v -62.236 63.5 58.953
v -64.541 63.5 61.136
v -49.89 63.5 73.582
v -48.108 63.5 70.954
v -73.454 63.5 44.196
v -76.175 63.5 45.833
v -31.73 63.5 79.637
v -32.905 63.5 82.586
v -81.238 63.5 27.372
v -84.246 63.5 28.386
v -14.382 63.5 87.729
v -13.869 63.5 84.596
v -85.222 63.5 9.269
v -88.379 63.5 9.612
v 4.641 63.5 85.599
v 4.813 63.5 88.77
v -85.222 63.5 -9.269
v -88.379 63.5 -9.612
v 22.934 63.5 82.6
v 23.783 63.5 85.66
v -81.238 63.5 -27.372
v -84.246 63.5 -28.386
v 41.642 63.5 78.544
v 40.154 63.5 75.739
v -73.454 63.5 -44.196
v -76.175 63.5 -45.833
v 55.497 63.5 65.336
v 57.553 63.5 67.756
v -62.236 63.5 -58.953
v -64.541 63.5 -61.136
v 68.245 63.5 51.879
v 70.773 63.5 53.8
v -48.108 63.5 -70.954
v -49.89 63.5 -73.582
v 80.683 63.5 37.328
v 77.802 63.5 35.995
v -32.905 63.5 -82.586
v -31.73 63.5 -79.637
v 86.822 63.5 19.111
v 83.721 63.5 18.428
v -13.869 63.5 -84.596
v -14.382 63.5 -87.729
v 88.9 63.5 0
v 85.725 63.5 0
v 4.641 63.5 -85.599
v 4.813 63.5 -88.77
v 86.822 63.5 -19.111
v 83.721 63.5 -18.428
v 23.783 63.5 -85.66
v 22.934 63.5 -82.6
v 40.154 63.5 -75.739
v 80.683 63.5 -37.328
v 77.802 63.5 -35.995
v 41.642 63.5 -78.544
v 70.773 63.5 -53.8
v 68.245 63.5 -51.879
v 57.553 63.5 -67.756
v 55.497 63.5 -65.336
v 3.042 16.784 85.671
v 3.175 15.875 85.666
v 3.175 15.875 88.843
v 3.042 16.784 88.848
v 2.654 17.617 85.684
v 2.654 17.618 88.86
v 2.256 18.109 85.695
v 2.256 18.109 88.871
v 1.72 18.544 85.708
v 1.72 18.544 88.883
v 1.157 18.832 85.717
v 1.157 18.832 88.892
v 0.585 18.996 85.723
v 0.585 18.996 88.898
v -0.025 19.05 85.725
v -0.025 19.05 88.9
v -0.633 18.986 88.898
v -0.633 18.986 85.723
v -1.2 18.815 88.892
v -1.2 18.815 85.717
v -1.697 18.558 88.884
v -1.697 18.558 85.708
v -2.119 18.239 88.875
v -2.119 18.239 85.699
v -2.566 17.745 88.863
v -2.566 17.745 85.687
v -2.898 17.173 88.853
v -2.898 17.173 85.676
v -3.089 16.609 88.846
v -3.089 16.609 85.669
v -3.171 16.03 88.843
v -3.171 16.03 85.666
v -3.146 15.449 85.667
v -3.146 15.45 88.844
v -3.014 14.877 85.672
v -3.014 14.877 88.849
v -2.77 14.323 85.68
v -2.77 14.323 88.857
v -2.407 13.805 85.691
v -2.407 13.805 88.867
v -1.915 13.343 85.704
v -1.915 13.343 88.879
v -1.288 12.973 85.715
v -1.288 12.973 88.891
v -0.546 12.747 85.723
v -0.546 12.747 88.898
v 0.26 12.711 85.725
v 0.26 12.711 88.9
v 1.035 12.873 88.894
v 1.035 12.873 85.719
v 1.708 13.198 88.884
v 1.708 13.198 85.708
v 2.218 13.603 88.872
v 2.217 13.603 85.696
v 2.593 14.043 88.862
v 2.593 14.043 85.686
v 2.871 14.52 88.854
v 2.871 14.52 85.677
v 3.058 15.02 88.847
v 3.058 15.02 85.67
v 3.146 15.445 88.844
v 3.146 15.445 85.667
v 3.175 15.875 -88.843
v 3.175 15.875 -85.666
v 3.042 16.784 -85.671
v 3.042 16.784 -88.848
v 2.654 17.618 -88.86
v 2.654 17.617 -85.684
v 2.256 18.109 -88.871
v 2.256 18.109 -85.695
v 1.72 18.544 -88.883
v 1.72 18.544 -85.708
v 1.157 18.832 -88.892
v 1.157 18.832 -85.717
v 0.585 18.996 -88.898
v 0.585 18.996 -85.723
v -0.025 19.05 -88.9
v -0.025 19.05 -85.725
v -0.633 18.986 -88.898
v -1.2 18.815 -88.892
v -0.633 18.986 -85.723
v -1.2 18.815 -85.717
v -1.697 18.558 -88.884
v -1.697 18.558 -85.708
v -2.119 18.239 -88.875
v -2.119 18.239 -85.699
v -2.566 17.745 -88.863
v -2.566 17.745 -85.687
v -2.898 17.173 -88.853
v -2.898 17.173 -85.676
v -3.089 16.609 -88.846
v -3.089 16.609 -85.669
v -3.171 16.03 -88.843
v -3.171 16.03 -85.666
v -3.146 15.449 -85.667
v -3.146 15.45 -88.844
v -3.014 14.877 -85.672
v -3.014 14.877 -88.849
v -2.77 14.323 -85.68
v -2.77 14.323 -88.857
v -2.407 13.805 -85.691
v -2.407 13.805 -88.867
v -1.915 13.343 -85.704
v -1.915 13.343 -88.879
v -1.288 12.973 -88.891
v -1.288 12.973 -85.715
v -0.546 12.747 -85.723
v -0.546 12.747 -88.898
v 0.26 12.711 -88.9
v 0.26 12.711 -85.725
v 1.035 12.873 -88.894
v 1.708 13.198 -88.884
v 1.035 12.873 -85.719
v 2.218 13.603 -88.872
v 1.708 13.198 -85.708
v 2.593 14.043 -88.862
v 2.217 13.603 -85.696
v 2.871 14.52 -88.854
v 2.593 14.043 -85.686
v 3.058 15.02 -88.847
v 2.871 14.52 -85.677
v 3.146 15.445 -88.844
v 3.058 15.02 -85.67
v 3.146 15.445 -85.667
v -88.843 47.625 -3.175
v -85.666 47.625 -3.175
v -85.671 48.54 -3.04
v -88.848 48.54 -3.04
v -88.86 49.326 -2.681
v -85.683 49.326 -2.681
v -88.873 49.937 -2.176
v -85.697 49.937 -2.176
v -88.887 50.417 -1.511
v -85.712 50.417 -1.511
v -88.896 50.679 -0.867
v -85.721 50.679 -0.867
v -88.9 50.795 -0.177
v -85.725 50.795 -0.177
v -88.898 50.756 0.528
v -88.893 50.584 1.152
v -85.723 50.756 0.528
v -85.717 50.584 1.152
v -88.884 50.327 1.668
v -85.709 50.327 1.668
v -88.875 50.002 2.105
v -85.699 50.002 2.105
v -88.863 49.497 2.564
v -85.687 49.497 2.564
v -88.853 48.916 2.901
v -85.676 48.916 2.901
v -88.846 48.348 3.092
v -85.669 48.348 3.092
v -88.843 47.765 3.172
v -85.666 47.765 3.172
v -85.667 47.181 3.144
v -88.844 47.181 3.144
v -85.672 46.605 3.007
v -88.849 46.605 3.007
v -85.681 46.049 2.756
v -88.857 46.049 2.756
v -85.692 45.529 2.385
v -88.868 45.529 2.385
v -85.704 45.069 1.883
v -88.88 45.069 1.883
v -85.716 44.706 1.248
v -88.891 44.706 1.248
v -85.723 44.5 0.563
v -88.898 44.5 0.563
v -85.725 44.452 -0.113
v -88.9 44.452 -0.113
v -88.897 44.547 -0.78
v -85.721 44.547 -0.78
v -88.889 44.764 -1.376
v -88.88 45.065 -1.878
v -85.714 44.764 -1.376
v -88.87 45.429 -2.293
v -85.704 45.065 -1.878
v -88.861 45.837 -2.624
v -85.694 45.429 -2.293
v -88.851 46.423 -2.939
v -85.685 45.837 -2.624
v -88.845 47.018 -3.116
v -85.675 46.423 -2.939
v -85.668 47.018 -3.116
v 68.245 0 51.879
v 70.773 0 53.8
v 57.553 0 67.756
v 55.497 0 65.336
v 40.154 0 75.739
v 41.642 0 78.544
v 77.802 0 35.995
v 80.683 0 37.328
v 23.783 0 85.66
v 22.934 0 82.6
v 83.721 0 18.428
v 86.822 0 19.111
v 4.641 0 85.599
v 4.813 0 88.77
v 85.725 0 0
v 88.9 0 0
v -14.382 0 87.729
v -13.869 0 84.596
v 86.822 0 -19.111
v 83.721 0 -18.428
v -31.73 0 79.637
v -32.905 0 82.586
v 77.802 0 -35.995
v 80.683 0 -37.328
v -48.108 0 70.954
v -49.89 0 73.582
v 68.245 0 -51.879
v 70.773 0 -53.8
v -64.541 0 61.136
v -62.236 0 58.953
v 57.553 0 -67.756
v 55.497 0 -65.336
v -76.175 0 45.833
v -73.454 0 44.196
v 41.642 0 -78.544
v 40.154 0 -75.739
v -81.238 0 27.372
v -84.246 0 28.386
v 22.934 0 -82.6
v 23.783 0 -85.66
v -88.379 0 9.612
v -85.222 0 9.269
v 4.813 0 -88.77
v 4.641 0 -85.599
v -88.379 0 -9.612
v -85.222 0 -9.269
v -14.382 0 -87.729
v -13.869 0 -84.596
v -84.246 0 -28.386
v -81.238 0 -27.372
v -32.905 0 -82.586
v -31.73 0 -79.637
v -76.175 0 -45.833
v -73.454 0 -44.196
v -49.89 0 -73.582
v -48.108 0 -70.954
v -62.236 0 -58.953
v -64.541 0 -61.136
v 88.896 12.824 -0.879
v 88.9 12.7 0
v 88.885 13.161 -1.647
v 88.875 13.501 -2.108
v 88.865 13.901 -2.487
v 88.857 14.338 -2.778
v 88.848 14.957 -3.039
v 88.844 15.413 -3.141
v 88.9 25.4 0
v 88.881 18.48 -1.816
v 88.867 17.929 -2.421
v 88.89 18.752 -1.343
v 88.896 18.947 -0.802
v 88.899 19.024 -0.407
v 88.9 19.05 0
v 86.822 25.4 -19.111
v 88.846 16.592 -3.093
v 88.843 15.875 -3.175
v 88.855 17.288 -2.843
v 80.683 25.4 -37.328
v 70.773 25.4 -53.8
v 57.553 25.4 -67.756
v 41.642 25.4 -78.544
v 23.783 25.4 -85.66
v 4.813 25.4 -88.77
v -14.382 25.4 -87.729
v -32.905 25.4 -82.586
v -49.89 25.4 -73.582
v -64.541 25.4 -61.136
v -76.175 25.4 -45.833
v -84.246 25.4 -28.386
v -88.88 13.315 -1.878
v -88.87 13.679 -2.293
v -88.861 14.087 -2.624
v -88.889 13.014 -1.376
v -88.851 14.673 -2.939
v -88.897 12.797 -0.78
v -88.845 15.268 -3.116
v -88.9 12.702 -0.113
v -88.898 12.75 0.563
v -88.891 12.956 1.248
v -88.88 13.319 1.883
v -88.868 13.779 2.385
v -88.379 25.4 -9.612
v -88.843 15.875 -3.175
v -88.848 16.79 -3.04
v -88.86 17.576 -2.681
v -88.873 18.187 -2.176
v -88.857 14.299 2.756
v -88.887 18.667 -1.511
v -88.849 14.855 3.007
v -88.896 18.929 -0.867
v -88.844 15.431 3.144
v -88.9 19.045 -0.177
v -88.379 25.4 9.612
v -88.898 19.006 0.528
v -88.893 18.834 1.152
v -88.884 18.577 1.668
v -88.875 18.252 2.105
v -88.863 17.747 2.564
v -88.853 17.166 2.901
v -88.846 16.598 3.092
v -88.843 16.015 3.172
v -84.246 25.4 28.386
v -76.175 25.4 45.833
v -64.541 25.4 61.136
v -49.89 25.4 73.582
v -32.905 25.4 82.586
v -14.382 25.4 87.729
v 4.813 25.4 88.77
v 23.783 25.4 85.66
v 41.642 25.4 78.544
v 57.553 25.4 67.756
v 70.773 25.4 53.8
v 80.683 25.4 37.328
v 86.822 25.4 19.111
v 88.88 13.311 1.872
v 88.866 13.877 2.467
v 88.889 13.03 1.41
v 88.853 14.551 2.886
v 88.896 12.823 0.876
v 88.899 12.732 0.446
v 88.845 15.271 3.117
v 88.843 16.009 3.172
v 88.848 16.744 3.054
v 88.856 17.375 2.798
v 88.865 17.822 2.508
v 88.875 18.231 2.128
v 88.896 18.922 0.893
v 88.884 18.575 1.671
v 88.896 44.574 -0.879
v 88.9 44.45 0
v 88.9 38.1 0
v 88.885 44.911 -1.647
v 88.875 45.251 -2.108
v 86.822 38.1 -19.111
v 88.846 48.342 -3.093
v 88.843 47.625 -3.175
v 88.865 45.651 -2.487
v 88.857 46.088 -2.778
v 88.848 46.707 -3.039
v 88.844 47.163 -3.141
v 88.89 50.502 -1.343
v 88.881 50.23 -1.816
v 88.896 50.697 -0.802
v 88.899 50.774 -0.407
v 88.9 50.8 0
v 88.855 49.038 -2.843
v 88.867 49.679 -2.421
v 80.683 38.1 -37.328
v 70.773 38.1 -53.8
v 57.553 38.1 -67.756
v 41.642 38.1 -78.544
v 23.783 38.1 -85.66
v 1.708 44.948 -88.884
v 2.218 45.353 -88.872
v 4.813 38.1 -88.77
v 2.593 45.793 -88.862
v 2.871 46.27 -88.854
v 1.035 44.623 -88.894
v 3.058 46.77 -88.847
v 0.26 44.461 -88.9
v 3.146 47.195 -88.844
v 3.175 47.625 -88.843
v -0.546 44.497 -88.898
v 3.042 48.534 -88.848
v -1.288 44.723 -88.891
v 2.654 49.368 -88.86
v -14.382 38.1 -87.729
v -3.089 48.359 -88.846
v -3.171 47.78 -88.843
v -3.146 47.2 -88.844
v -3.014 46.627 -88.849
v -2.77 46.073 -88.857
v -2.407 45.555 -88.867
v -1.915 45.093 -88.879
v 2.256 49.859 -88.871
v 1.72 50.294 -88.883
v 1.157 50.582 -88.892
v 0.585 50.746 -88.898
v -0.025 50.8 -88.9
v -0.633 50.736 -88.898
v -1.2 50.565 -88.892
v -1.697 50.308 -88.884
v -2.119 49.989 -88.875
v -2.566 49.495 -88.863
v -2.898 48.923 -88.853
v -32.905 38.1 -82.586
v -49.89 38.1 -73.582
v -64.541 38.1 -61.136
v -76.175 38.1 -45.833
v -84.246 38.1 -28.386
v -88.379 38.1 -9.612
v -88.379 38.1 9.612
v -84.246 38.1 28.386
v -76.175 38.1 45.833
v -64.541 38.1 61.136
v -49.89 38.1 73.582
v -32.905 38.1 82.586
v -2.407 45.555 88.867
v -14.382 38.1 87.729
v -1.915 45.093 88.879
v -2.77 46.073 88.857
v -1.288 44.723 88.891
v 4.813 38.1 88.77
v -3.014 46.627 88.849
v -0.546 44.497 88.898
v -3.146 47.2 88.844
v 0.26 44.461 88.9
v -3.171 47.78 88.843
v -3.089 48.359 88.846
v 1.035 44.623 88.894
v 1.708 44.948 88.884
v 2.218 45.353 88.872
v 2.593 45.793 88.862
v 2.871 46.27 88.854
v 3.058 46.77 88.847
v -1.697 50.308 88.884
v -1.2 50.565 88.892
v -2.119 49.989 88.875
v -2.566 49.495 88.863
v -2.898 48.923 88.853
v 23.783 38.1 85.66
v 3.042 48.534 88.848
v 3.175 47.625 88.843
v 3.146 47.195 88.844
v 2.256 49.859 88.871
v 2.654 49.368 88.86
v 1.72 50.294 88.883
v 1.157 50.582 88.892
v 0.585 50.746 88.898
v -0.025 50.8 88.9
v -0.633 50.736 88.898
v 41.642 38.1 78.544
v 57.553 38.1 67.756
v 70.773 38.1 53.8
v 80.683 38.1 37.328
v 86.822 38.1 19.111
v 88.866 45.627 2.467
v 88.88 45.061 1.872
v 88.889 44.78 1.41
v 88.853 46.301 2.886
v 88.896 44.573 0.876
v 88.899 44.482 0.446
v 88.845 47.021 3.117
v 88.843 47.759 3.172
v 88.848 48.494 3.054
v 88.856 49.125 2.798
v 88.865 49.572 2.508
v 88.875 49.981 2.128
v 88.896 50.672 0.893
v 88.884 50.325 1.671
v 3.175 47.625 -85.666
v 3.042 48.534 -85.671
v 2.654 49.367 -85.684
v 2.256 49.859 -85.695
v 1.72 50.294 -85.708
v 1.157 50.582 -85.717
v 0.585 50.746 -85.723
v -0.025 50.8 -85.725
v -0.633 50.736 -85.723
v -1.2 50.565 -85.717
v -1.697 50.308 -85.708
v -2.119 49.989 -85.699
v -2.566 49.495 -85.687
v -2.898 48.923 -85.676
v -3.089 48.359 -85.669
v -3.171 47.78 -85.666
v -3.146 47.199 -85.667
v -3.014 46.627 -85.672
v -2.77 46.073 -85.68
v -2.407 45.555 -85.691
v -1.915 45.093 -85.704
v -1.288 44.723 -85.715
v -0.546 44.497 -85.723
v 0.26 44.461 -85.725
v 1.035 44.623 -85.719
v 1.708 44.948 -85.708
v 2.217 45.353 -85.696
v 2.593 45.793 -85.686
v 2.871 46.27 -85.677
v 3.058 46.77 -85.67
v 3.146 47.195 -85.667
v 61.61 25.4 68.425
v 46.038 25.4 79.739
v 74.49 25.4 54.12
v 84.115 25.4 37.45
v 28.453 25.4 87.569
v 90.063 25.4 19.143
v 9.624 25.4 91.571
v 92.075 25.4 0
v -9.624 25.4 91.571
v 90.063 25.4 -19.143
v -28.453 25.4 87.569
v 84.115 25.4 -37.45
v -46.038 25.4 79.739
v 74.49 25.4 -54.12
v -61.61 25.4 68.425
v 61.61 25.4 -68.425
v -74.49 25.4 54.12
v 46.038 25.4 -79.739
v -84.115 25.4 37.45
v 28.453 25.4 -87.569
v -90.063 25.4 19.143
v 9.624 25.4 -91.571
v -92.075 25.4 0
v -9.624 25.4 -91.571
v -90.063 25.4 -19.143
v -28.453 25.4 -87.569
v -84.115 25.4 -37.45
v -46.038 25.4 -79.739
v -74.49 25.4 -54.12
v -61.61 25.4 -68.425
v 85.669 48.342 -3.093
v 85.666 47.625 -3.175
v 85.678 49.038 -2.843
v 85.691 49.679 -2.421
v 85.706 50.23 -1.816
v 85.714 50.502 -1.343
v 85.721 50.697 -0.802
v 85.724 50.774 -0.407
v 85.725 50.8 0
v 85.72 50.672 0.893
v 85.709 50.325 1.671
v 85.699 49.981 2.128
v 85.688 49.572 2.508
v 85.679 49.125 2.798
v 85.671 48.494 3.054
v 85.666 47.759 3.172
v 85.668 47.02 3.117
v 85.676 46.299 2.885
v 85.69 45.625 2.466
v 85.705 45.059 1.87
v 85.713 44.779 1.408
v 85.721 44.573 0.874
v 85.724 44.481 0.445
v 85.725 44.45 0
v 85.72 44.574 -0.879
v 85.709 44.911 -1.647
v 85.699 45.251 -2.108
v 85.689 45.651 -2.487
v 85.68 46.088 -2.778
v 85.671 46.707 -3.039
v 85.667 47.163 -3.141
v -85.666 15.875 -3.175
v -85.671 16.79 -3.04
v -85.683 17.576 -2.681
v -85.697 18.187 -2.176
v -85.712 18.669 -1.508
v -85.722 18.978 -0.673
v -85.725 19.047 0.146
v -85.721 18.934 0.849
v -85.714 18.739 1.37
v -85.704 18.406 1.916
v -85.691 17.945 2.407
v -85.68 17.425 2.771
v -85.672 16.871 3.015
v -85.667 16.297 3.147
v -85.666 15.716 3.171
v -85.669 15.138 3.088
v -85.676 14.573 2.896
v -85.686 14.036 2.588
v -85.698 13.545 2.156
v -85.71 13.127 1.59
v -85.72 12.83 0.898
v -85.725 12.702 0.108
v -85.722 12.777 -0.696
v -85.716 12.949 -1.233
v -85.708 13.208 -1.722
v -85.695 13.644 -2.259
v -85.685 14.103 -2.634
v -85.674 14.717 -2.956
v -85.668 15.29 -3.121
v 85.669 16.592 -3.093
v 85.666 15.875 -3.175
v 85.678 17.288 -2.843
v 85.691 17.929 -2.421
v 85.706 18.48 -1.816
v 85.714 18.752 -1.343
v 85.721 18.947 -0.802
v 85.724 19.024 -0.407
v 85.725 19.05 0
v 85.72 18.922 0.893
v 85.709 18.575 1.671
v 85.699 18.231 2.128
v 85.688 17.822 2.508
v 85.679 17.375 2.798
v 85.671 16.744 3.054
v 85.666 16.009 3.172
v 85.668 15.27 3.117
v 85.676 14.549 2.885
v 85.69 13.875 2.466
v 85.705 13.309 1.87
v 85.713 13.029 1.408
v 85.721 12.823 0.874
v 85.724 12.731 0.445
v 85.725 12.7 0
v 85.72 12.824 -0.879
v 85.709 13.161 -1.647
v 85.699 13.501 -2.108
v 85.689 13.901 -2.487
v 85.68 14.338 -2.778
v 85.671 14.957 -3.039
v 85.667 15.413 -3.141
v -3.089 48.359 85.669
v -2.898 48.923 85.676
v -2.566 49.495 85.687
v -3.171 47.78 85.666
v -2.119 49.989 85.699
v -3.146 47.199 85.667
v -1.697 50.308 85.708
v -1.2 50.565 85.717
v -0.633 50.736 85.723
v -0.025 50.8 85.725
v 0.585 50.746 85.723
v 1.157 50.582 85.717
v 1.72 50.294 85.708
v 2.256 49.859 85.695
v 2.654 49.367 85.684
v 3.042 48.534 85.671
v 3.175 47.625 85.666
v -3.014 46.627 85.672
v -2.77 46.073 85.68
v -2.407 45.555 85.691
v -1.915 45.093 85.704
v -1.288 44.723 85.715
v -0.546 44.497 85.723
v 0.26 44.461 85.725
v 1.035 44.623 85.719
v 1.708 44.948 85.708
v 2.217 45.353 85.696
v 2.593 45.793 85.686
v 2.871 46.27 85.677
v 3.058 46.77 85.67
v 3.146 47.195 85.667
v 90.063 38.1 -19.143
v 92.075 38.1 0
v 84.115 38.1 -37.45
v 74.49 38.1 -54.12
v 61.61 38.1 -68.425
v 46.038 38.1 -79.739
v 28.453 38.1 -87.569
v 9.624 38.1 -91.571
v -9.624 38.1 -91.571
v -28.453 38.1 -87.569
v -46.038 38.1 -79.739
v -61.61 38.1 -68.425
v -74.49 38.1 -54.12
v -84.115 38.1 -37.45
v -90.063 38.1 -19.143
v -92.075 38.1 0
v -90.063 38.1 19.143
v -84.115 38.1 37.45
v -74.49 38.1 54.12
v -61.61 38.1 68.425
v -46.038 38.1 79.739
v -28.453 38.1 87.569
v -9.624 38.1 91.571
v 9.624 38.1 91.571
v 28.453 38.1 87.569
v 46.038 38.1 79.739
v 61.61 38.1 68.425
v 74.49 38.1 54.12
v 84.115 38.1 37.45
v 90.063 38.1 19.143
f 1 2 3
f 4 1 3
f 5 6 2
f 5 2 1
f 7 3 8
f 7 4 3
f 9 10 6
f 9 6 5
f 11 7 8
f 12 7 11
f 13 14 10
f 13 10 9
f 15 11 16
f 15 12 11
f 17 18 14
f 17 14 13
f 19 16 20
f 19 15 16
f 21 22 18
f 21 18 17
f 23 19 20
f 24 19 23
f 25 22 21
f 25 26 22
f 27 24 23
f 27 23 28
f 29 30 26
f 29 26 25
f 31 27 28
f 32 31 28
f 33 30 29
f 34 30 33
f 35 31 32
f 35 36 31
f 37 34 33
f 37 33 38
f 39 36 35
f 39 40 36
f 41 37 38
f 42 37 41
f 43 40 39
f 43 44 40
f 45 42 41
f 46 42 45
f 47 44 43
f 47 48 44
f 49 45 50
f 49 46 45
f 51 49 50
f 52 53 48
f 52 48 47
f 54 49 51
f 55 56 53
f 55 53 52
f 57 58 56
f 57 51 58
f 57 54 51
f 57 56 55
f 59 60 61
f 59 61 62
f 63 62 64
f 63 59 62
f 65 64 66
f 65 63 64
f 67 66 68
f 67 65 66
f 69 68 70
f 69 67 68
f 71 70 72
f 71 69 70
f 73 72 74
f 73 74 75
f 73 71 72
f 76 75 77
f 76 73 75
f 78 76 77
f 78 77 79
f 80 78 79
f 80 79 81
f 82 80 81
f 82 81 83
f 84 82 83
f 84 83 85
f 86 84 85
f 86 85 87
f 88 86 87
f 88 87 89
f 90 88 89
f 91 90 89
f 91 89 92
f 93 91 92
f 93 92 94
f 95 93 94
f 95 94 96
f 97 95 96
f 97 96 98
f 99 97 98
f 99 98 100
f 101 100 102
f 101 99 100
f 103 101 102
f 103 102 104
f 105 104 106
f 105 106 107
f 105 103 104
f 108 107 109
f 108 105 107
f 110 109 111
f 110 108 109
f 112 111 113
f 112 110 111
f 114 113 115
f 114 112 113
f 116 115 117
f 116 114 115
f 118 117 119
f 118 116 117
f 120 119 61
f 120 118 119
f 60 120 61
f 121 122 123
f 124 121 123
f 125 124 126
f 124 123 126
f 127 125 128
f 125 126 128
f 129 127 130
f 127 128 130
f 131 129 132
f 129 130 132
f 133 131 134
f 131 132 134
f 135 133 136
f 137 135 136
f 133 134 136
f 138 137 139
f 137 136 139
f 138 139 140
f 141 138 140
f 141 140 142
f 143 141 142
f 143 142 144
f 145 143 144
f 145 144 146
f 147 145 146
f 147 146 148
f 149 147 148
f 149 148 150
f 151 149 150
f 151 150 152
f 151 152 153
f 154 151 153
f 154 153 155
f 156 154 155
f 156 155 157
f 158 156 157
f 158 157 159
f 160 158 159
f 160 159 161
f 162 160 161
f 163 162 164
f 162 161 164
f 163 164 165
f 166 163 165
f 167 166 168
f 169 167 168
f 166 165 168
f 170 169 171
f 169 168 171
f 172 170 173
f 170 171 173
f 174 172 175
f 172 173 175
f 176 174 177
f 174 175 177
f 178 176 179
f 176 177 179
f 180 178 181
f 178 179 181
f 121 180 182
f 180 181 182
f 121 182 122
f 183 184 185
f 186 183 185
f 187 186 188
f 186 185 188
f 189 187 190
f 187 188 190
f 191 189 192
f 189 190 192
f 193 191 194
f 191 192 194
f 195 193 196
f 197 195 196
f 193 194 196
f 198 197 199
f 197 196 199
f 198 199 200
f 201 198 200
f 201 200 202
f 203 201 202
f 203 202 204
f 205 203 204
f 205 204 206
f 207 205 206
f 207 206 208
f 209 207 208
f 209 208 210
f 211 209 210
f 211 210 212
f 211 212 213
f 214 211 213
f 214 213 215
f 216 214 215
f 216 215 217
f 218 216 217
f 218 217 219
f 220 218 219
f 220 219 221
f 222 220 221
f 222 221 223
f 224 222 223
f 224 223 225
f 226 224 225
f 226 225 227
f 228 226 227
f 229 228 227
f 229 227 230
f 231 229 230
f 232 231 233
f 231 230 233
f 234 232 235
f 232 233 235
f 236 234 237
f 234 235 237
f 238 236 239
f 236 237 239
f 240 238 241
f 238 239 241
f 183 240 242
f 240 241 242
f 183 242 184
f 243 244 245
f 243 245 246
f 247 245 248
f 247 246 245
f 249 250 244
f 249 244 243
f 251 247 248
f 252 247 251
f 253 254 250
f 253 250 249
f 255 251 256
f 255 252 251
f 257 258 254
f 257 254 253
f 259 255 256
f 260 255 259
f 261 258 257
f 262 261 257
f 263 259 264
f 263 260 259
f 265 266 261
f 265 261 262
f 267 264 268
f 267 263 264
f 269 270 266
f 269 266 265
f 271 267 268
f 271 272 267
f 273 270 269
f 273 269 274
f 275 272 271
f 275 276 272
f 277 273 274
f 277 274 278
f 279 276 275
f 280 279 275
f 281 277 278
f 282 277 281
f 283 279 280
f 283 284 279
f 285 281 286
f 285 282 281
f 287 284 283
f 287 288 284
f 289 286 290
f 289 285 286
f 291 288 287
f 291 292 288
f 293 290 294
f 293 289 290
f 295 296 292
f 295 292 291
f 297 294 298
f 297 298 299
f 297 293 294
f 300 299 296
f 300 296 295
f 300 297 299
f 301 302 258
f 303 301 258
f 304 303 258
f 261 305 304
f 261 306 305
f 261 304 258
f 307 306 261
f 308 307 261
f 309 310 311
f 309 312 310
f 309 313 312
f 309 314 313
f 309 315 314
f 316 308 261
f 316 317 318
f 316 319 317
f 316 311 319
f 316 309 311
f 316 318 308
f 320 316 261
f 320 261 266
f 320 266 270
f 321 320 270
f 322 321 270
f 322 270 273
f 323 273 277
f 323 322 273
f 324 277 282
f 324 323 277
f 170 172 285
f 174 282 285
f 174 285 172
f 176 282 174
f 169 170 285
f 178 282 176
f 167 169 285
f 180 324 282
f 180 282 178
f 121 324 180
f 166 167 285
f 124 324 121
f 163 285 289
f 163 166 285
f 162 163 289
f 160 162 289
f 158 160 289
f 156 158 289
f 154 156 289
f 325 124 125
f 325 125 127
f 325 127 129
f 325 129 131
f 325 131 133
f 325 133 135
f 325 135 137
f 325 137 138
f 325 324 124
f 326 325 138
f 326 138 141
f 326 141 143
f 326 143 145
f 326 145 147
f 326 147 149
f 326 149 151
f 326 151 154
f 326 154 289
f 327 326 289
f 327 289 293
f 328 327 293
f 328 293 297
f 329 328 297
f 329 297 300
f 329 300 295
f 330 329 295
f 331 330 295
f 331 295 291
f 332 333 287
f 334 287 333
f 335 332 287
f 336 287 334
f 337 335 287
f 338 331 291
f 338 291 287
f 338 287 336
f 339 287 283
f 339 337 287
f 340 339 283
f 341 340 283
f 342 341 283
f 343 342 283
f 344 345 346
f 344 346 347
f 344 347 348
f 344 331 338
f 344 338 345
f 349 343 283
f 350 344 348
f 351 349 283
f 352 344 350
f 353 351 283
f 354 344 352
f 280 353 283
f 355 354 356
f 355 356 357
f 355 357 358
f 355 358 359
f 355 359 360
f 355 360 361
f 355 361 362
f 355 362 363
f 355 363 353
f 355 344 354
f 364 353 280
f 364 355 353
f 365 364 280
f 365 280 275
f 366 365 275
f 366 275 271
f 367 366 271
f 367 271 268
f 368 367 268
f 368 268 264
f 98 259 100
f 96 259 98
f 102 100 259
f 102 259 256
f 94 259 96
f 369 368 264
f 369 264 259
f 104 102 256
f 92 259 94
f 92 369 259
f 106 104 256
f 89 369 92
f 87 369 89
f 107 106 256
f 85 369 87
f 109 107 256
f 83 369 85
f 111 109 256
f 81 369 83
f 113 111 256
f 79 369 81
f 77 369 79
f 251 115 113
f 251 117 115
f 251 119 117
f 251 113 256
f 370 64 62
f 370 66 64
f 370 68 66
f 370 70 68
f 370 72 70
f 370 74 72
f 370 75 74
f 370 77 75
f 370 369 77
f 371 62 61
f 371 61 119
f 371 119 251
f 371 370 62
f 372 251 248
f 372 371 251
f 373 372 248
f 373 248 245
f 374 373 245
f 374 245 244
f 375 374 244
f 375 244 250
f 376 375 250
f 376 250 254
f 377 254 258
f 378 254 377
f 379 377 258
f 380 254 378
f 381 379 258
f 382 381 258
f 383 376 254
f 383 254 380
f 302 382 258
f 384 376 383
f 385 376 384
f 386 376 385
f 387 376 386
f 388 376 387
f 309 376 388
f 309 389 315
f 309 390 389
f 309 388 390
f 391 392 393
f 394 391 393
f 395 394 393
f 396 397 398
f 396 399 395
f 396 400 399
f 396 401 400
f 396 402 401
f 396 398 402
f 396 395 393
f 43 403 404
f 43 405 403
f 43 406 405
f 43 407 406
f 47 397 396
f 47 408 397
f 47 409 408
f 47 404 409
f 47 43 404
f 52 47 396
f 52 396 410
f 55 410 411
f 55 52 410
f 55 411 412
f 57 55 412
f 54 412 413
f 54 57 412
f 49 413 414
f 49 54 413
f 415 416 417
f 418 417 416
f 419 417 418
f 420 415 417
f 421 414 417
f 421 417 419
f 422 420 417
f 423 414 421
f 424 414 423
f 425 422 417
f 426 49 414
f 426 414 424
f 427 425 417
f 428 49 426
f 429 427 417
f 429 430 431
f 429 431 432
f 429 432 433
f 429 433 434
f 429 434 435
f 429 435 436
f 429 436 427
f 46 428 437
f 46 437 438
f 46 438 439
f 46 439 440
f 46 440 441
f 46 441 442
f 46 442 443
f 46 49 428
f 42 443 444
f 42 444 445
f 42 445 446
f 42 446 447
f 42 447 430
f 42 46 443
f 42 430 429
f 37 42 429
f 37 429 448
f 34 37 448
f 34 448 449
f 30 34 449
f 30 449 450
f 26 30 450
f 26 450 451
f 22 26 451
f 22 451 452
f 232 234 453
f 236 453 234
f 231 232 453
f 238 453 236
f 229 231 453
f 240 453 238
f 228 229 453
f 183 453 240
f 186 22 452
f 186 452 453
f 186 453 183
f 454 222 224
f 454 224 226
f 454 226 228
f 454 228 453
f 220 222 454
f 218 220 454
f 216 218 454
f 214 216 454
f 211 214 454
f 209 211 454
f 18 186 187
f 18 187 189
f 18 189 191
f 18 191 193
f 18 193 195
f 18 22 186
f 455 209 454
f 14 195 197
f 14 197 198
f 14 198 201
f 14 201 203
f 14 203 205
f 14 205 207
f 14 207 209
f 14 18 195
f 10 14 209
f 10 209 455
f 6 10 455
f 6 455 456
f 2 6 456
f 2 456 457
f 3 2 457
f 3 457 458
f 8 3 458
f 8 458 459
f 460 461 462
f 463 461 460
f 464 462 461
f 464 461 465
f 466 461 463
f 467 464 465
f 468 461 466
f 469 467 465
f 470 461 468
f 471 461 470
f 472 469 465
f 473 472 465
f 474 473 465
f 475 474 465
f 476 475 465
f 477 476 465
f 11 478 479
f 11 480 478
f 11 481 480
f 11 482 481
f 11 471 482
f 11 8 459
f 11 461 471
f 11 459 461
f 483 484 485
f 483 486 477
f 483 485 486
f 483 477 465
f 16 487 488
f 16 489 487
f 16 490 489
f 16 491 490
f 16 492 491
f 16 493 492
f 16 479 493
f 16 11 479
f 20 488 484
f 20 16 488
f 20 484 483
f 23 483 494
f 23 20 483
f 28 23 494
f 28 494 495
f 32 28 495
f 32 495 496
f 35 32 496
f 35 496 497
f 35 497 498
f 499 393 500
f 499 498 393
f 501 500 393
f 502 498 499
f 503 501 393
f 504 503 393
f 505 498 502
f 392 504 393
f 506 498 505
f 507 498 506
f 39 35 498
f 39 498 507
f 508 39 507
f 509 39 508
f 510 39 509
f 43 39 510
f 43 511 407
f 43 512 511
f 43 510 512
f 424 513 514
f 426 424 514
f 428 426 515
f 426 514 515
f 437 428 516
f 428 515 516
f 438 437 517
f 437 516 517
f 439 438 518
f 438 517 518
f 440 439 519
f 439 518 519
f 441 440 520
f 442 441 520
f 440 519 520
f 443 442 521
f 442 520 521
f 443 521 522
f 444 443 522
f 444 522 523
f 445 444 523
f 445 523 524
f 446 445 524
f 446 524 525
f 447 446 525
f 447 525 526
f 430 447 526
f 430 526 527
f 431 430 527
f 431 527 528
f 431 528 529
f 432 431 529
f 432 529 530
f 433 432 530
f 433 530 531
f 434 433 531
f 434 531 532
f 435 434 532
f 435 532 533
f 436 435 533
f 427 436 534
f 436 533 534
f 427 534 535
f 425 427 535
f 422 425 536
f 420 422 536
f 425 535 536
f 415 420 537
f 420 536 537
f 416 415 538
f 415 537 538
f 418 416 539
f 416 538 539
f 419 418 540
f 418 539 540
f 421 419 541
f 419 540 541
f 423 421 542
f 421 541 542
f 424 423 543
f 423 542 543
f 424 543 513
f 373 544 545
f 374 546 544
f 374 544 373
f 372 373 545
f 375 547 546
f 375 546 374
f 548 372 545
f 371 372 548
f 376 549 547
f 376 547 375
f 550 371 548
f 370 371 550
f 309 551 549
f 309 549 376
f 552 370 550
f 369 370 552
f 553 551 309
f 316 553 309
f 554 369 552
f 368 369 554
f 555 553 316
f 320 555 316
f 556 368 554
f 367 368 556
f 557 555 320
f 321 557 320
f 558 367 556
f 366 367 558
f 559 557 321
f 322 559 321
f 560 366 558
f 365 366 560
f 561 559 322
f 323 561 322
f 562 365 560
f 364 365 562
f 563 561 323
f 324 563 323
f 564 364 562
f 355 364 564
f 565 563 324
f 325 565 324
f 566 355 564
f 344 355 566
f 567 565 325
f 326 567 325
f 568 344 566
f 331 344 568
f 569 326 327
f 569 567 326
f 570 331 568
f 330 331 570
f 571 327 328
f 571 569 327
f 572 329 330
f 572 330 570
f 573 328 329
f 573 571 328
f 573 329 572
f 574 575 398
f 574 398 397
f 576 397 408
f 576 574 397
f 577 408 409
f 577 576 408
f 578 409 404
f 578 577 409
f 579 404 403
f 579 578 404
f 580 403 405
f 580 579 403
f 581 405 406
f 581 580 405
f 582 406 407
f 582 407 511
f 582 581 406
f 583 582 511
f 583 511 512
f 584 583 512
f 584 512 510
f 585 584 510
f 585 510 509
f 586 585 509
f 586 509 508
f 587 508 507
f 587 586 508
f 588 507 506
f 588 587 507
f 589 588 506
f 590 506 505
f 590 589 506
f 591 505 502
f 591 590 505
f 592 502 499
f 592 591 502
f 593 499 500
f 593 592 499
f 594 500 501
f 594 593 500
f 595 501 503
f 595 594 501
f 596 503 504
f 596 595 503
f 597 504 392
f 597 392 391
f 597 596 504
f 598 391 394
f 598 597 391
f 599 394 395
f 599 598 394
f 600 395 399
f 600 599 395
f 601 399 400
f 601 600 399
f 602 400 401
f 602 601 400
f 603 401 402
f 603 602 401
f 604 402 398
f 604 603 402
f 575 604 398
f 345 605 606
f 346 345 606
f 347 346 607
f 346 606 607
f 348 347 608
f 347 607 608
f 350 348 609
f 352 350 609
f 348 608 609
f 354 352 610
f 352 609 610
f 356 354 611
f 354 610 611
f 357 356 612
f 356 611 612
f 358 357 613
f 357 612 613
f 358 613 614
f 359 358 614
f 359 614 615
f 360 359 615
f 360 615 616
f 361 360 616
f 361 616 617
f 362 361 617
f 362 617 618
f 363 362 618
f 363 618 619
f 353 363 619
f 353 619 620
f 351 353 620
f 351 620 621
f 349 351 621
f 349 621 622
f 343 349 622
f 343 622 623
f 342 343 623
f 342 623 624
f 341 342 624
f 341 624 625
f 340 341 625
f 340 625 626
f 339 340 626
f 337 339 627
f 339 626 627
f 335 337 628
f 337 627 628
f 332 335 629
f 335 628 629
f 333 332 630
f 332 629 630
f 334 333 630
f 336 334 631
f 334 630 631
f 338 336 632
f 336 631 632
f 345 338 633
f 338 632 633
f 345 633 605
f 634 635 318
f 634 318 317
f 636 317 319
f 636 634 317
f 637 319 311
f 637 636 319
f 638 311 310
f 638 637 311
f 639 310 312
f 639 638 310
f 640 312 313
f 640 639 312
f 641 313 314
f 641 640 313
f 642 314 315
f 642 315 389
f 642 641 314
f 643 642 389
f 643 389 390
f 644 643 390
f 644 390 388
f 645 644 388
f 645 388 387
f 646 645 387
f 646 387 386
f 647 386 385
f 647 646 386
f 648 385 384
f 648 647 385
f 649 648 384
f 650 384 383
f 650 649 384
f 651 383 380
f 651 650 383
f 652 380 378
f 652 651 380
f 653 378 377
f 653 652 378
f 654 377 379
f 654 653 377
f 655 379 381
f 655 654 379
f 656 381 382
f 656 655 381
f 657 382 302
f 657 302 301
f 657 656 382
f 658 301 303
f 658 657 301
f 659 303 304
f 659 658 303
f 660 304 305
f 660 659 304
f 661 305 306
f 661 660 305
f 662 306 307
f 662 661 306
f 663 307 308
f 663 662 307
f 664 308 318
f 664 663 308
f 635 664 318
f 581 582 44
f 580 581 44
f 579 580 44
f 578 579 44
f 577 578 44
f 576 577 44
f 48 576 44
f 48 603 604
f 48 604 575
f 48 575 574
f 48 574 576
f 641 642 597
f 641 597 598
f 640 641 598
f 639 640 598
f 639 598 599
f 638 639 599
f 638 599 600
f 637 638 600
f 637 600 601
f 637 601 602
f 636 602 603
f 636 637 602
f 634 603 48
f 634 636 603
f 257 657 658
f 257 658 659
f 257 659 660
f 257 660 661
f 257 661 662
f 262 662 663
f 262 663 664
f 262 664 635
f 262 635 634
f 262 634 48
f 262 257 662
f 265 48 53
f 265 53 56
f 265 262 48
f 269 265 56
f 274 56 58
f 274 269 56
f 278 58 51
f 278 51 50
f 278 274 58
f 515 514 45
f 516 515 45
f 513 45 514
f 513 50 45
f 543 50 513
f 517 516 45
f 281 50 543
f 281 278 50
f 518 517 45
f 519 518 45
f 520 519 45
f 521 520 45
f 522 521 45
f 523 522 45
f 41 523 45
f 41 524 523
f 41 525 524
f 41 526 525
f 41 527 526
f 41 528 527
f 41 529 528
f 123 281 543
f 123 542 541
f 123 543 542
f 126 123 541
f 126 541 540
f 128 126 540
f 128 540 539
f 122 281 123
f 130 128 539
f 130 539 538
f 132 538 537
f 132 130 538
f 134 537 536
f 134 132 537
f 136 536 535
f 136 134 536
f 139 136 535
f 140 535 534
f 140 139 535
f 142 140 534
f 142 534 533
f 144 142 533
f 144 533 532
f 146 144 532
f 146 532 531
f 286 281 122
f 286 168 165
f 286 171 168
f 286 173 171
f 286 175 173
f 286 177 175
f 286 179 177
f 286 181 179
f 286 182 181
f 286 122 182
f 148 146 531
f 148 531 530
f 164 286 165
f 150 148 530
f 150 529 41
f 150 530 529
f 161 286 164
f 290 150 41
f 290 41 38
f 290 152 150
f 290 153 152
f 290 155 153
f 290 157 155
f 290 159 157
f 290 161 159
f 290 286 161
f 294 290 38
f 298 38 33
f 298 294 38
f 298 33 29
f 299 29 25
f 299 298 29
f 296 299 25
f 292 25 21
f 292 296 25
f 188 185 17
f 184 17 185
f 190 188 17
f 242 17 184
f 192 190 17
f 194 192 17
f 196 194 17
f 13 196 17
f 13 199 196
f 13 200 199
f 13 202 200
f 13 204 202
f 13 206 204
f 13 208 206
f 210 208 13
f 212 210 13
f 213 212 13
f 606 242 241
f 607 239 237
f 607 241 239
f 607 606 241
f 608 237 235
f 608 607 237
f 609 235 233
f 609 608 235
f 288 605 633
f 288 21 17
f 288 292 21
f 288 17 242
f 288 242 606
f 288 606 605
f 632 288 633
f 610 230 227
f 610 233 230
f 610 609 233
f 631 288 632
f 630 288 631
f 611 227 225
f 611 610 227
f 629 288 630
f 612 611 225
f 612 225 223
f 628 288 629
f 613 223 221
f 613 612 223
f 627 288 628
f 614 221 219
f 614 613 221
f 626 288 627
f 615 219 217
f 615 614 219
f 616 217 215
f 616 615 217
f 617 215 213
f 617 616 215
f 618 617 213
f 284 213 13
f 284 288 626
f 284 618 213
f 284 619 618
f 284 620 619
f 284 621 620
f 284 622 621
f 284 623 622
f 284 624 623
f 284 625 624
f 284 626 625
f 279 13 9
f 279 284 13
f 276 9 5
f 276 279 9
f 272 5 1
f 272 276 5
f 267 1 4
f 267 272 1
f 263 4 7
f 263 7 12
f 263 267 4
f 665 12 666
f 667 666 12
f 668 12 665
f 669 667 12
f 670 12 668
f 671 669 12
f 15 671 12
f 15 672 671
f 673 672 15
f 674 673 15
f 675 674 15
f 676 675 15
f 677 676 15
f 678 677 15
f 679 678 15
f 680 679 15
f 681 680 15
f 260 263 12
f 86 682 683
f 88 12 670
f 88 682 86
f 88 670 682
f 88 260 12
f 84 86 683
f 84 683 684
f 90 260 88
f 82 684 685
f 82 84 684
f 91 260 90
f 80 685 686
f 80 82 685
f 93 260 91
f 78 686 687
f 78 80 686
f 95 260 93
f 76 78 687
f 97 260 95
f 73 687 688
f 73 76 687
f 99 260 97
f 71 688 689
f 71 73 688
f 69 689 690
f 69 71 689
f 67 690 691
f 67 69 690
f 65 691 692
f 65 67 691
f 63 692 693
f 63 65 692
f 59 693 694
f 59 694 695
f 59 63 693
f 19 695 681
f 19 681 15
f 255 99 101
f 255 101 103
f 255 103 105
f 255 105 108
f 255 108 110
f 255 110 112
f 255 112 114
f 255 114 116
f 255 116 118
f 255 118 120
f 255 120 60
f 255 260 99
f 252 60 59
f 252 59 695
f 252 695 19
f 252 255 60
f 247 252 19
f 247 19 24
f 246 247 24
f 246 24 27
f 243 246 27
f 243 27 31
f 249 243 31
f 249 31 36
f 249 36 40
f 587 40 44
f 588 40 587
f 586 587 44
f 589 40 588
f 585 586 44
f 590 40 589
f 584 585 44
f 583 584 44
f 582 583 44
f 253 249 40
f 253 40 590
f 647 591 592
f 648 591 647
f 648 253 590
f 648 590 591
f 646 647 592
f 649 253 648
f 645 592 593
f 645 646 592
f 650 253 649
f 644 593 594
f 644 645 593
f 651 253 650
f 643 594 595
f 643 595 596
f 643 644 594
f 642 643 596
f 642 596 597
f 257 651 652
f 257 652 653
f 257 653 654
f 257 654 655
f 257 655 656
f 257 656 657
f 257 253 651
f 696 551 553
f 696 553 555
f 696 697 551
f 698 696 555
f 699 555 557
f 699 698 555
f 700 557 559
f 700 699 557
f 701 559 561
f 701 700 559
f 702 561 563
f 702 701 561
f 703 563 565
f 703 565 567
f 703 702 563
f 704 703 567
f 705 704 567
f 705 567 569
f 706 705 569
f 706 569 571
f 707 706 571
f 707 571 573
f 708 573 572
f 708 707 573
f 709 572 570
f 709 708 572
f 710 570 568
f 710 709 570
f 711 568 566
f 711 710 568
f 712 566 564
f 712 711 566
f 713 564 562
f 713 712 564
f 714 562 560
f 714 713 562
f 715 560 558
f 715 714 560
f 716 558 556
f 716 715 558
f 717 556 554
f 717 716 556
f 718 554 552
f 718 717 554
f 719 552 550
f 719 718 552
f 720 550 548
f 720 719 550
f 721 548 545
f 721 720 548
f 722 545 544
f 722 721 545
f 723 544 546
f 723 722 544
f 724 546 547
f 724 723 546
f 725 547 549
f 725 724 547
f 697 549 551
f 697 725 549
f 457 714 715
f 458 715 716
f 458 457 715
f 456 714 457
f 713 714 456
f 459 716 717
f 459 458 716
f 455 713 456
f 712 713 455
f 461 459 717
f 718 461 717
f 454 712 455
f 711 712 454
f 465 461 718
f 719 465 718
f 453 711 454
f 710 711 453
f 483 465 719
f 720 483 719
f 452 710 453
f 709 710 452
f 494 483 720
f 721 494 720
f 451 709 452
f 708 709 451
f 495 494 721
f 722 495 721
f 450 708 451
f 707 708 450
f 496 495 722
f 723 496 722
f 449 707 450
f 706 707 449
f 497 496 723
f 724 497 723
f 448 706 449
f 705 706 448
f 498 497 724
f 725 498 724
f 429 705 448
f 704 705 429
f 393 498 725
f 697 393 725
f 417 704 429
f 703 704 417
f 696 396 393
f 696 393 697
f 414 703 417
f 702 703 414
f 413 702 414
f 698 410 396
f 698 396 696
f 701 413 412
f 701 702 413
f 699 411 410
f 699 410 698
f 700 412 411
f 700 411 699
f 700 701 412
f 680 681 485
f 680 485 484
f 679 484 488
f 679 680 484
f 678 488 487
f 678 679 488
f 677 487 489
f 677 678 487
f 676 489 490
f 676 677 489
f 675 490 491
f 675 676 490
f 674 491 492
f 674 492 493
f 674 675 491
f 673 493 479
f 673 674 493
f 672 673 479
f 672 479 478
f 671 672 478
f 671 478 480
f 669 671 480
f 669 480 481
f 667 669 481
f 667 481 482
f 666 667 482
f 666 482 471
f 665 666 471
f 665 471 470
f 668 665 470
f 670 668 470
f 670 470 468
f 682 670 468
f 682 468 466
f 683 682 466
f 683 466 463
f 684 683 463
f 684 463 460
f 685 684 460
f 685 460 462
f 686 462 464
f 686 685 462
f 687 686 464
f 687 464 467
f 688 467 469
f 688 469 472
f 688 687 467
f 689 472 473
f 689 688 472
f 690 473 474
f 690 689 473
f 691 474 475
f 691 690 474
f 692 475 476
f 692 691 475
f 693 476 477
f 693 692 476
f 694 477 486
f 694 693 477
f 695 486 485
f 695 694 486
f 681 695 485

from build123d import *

# Parameters (mm, degrees)
SKETCH2_R               = 3.175
CUT_EXTRUDE1_DEPTH      = 93.075
CUT_EXTRUDE1_DEPTH_BACK = 93.075
SKETCH3_R               = 3.175
CUT_EXTRUDE2_DEPTH      = 93.075
CUT_EXTRUDE2_DEPTH_BACK = 93.075


with BuildPart() as part:
    # Sketch1 → Revolve1 (revolve)
    with BuildSketch(Plane.XY):
        Polygon((92.075, 25.4), (92.075, 38.1), (88.9, 38.1), (88.9, 63.5), (85.725, 63.5), (85.725, 0), (88.9, 0), (88.9, 25.4), align=None)
    revolve(axis=Axis((0, 0, 0), (0, 1, 0)))

    # Sketch2 → Cut-Extrude1 (cut, two sides)
    with BuildSketch(Plane.XY) as cut_extrude1_sk:
        with Locations((0, 47.625)):
            Circle(SKETCH2_R)
        with Locations((0, 15.875)):
            Circle(SKETCH2_R)
    extrude(amount=CUT_EXTRUDE1_DEPTH, mode=Mode.SUBTRACT)
    extrude(cut_extrude1_sk.sketch, amount=-CUT_EXTRUDE1_DEPTH_BACK, mode=Mode.SUBTRACT)

    # Sketch3 → Cut-Extrude2 (cut, two sides)
    with BuildSketch(Plane(origin=(0, 0, 0), x_dir=(0, 0, -1), z_dir=(1, 0, 0))) as cut_extrude2_sk:
        with Locations((0, 47.625)):
            Circle(SKETCH3_R)
        with Locations((0, 15.875)):
            Circle(SKETCH3_R)
    extrude(amount=CUT_EXTRUDE2_DEPTH, mode=Mode.SUBTRACT)
    extrude(cut_extrude2_sk.sketch, amount=-CUT_EXTRUDE2_DEPTH_BACK, mode=Mode.SUBTRACT)


solid = part.part
